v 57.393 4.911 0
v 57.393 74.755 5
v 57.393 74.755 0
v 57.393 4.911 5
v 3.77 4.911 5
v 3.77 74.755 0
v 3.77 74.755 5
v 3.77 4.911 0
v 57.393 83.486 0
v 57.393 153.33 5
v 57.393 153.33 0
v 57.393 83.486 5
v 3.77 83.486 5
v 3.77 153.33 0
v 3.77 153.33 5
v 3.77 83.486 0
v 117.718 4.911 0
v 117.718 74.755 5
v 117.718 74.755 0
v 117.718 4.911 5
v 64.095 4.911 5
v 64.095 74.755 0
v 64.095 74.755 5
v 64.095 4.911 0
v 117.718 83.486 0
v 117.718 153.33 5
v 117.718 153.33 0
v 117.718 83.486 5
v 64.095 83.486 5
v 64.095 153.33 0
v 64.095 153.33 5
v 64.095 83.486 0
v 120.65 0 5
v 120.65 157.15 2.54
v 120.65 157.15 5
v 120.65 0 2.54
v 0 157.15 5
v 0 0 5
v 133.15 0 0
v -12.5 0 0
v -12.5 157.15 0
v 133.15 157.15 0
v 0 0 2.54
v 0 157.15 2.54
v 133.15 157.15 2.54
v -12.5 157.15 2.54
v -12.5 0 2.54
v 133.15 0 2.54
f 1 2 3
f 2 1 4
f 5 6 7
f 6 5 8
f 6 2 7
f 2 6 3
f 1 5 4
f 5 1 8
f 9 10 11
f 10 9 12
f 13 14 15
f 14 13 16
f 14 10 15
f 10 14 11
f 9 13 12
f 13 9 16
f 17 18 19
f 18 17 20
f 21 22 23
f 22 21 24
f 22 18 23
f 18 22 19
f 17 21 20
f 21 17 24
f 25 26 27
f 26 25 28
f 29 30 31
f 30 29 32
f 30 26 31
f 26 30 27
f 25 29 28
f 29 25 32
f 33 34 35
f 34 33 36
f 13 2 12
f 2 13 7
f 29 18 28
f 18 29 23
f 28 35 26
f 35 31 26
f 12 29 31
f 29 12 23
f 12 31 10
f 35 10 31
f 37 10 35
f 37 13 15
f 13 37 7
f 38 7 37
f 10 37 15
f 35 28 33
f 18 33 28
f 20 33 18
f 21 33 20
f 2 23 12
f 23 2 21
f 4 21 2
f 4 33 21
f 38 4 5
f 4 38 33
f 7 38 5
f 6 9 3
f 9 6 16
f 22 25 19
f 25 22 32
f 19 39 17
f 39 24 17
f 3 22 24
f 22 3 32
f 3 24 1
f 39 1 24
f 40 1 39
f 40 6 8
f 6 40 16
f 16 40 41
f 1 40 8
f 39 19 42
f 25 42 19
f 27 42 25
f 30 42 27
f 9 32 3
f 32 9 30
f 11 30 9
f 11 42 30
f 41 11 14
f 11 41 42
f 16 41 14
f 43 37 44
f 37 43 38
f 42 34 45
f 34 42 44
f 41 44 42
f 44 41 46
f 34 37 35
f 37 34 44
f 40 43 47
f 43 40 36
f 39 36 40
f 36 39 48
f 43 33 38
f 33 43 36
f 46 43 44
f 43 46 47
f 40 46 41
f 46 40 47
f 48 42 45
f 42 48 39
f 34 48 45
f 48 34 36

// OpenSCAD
//////////////////////////////////////////////////KeyguardWithTabs
//author: Tim Driskell
//date: 12/10/2015
/////////////////////////////////////////////////


//////////////user inputs////////////////////////

height =157.15;//desired length of the keyguard
width = 120.65;//desired width of the keyguard
depth = 5;//keyguard thickness
cols= 2;//the number of cutouts in relation to the width of the device
rows = 2;//the number of cutouts in relation to the length of the device
tab_length = 12.5; //thickness of attachment tabs.


////////////////renderings///////////////////////
keyguard();


///////////////////modules///////////////////////
module keyguard(){
    difference(){
      cube([width,height,depth]);
        inserts();
    }
    tabs();
}
module inserts(){
    //alpha changes the size of cutouts. Size of cutout is inversely proportional to alpha
    alpha=0.25;
    //creates cutouts in x-direction
    for (i=[0:cols-1]){
    //creates cutouts in y-direction
        for (j=[0:rows-1]){
    //determines location of each cutout iterations
            translate([width/cols*i+width/(cols*(2*cols+0.75*pow((1/alpha),2))),height/rows*j+height/(rows*(2*rows+0.75*pow((1/alpha),2))),-0.01])
    //cutout size proportional to size of keyguard        
            cube([width*(cols/((cols+alpha)*(cols))),height*(rows/((rows)*(rows+alpha))),depth+0.02]);
            //changing alpha increases cutout size. 
        }
    }
}

module tabs() {
    translate([-tab_length,0,0])
    cube([tab_length,height,2.54]);
    translate([width,0,0])
    cube([tab_length,height,2.54]);
}
